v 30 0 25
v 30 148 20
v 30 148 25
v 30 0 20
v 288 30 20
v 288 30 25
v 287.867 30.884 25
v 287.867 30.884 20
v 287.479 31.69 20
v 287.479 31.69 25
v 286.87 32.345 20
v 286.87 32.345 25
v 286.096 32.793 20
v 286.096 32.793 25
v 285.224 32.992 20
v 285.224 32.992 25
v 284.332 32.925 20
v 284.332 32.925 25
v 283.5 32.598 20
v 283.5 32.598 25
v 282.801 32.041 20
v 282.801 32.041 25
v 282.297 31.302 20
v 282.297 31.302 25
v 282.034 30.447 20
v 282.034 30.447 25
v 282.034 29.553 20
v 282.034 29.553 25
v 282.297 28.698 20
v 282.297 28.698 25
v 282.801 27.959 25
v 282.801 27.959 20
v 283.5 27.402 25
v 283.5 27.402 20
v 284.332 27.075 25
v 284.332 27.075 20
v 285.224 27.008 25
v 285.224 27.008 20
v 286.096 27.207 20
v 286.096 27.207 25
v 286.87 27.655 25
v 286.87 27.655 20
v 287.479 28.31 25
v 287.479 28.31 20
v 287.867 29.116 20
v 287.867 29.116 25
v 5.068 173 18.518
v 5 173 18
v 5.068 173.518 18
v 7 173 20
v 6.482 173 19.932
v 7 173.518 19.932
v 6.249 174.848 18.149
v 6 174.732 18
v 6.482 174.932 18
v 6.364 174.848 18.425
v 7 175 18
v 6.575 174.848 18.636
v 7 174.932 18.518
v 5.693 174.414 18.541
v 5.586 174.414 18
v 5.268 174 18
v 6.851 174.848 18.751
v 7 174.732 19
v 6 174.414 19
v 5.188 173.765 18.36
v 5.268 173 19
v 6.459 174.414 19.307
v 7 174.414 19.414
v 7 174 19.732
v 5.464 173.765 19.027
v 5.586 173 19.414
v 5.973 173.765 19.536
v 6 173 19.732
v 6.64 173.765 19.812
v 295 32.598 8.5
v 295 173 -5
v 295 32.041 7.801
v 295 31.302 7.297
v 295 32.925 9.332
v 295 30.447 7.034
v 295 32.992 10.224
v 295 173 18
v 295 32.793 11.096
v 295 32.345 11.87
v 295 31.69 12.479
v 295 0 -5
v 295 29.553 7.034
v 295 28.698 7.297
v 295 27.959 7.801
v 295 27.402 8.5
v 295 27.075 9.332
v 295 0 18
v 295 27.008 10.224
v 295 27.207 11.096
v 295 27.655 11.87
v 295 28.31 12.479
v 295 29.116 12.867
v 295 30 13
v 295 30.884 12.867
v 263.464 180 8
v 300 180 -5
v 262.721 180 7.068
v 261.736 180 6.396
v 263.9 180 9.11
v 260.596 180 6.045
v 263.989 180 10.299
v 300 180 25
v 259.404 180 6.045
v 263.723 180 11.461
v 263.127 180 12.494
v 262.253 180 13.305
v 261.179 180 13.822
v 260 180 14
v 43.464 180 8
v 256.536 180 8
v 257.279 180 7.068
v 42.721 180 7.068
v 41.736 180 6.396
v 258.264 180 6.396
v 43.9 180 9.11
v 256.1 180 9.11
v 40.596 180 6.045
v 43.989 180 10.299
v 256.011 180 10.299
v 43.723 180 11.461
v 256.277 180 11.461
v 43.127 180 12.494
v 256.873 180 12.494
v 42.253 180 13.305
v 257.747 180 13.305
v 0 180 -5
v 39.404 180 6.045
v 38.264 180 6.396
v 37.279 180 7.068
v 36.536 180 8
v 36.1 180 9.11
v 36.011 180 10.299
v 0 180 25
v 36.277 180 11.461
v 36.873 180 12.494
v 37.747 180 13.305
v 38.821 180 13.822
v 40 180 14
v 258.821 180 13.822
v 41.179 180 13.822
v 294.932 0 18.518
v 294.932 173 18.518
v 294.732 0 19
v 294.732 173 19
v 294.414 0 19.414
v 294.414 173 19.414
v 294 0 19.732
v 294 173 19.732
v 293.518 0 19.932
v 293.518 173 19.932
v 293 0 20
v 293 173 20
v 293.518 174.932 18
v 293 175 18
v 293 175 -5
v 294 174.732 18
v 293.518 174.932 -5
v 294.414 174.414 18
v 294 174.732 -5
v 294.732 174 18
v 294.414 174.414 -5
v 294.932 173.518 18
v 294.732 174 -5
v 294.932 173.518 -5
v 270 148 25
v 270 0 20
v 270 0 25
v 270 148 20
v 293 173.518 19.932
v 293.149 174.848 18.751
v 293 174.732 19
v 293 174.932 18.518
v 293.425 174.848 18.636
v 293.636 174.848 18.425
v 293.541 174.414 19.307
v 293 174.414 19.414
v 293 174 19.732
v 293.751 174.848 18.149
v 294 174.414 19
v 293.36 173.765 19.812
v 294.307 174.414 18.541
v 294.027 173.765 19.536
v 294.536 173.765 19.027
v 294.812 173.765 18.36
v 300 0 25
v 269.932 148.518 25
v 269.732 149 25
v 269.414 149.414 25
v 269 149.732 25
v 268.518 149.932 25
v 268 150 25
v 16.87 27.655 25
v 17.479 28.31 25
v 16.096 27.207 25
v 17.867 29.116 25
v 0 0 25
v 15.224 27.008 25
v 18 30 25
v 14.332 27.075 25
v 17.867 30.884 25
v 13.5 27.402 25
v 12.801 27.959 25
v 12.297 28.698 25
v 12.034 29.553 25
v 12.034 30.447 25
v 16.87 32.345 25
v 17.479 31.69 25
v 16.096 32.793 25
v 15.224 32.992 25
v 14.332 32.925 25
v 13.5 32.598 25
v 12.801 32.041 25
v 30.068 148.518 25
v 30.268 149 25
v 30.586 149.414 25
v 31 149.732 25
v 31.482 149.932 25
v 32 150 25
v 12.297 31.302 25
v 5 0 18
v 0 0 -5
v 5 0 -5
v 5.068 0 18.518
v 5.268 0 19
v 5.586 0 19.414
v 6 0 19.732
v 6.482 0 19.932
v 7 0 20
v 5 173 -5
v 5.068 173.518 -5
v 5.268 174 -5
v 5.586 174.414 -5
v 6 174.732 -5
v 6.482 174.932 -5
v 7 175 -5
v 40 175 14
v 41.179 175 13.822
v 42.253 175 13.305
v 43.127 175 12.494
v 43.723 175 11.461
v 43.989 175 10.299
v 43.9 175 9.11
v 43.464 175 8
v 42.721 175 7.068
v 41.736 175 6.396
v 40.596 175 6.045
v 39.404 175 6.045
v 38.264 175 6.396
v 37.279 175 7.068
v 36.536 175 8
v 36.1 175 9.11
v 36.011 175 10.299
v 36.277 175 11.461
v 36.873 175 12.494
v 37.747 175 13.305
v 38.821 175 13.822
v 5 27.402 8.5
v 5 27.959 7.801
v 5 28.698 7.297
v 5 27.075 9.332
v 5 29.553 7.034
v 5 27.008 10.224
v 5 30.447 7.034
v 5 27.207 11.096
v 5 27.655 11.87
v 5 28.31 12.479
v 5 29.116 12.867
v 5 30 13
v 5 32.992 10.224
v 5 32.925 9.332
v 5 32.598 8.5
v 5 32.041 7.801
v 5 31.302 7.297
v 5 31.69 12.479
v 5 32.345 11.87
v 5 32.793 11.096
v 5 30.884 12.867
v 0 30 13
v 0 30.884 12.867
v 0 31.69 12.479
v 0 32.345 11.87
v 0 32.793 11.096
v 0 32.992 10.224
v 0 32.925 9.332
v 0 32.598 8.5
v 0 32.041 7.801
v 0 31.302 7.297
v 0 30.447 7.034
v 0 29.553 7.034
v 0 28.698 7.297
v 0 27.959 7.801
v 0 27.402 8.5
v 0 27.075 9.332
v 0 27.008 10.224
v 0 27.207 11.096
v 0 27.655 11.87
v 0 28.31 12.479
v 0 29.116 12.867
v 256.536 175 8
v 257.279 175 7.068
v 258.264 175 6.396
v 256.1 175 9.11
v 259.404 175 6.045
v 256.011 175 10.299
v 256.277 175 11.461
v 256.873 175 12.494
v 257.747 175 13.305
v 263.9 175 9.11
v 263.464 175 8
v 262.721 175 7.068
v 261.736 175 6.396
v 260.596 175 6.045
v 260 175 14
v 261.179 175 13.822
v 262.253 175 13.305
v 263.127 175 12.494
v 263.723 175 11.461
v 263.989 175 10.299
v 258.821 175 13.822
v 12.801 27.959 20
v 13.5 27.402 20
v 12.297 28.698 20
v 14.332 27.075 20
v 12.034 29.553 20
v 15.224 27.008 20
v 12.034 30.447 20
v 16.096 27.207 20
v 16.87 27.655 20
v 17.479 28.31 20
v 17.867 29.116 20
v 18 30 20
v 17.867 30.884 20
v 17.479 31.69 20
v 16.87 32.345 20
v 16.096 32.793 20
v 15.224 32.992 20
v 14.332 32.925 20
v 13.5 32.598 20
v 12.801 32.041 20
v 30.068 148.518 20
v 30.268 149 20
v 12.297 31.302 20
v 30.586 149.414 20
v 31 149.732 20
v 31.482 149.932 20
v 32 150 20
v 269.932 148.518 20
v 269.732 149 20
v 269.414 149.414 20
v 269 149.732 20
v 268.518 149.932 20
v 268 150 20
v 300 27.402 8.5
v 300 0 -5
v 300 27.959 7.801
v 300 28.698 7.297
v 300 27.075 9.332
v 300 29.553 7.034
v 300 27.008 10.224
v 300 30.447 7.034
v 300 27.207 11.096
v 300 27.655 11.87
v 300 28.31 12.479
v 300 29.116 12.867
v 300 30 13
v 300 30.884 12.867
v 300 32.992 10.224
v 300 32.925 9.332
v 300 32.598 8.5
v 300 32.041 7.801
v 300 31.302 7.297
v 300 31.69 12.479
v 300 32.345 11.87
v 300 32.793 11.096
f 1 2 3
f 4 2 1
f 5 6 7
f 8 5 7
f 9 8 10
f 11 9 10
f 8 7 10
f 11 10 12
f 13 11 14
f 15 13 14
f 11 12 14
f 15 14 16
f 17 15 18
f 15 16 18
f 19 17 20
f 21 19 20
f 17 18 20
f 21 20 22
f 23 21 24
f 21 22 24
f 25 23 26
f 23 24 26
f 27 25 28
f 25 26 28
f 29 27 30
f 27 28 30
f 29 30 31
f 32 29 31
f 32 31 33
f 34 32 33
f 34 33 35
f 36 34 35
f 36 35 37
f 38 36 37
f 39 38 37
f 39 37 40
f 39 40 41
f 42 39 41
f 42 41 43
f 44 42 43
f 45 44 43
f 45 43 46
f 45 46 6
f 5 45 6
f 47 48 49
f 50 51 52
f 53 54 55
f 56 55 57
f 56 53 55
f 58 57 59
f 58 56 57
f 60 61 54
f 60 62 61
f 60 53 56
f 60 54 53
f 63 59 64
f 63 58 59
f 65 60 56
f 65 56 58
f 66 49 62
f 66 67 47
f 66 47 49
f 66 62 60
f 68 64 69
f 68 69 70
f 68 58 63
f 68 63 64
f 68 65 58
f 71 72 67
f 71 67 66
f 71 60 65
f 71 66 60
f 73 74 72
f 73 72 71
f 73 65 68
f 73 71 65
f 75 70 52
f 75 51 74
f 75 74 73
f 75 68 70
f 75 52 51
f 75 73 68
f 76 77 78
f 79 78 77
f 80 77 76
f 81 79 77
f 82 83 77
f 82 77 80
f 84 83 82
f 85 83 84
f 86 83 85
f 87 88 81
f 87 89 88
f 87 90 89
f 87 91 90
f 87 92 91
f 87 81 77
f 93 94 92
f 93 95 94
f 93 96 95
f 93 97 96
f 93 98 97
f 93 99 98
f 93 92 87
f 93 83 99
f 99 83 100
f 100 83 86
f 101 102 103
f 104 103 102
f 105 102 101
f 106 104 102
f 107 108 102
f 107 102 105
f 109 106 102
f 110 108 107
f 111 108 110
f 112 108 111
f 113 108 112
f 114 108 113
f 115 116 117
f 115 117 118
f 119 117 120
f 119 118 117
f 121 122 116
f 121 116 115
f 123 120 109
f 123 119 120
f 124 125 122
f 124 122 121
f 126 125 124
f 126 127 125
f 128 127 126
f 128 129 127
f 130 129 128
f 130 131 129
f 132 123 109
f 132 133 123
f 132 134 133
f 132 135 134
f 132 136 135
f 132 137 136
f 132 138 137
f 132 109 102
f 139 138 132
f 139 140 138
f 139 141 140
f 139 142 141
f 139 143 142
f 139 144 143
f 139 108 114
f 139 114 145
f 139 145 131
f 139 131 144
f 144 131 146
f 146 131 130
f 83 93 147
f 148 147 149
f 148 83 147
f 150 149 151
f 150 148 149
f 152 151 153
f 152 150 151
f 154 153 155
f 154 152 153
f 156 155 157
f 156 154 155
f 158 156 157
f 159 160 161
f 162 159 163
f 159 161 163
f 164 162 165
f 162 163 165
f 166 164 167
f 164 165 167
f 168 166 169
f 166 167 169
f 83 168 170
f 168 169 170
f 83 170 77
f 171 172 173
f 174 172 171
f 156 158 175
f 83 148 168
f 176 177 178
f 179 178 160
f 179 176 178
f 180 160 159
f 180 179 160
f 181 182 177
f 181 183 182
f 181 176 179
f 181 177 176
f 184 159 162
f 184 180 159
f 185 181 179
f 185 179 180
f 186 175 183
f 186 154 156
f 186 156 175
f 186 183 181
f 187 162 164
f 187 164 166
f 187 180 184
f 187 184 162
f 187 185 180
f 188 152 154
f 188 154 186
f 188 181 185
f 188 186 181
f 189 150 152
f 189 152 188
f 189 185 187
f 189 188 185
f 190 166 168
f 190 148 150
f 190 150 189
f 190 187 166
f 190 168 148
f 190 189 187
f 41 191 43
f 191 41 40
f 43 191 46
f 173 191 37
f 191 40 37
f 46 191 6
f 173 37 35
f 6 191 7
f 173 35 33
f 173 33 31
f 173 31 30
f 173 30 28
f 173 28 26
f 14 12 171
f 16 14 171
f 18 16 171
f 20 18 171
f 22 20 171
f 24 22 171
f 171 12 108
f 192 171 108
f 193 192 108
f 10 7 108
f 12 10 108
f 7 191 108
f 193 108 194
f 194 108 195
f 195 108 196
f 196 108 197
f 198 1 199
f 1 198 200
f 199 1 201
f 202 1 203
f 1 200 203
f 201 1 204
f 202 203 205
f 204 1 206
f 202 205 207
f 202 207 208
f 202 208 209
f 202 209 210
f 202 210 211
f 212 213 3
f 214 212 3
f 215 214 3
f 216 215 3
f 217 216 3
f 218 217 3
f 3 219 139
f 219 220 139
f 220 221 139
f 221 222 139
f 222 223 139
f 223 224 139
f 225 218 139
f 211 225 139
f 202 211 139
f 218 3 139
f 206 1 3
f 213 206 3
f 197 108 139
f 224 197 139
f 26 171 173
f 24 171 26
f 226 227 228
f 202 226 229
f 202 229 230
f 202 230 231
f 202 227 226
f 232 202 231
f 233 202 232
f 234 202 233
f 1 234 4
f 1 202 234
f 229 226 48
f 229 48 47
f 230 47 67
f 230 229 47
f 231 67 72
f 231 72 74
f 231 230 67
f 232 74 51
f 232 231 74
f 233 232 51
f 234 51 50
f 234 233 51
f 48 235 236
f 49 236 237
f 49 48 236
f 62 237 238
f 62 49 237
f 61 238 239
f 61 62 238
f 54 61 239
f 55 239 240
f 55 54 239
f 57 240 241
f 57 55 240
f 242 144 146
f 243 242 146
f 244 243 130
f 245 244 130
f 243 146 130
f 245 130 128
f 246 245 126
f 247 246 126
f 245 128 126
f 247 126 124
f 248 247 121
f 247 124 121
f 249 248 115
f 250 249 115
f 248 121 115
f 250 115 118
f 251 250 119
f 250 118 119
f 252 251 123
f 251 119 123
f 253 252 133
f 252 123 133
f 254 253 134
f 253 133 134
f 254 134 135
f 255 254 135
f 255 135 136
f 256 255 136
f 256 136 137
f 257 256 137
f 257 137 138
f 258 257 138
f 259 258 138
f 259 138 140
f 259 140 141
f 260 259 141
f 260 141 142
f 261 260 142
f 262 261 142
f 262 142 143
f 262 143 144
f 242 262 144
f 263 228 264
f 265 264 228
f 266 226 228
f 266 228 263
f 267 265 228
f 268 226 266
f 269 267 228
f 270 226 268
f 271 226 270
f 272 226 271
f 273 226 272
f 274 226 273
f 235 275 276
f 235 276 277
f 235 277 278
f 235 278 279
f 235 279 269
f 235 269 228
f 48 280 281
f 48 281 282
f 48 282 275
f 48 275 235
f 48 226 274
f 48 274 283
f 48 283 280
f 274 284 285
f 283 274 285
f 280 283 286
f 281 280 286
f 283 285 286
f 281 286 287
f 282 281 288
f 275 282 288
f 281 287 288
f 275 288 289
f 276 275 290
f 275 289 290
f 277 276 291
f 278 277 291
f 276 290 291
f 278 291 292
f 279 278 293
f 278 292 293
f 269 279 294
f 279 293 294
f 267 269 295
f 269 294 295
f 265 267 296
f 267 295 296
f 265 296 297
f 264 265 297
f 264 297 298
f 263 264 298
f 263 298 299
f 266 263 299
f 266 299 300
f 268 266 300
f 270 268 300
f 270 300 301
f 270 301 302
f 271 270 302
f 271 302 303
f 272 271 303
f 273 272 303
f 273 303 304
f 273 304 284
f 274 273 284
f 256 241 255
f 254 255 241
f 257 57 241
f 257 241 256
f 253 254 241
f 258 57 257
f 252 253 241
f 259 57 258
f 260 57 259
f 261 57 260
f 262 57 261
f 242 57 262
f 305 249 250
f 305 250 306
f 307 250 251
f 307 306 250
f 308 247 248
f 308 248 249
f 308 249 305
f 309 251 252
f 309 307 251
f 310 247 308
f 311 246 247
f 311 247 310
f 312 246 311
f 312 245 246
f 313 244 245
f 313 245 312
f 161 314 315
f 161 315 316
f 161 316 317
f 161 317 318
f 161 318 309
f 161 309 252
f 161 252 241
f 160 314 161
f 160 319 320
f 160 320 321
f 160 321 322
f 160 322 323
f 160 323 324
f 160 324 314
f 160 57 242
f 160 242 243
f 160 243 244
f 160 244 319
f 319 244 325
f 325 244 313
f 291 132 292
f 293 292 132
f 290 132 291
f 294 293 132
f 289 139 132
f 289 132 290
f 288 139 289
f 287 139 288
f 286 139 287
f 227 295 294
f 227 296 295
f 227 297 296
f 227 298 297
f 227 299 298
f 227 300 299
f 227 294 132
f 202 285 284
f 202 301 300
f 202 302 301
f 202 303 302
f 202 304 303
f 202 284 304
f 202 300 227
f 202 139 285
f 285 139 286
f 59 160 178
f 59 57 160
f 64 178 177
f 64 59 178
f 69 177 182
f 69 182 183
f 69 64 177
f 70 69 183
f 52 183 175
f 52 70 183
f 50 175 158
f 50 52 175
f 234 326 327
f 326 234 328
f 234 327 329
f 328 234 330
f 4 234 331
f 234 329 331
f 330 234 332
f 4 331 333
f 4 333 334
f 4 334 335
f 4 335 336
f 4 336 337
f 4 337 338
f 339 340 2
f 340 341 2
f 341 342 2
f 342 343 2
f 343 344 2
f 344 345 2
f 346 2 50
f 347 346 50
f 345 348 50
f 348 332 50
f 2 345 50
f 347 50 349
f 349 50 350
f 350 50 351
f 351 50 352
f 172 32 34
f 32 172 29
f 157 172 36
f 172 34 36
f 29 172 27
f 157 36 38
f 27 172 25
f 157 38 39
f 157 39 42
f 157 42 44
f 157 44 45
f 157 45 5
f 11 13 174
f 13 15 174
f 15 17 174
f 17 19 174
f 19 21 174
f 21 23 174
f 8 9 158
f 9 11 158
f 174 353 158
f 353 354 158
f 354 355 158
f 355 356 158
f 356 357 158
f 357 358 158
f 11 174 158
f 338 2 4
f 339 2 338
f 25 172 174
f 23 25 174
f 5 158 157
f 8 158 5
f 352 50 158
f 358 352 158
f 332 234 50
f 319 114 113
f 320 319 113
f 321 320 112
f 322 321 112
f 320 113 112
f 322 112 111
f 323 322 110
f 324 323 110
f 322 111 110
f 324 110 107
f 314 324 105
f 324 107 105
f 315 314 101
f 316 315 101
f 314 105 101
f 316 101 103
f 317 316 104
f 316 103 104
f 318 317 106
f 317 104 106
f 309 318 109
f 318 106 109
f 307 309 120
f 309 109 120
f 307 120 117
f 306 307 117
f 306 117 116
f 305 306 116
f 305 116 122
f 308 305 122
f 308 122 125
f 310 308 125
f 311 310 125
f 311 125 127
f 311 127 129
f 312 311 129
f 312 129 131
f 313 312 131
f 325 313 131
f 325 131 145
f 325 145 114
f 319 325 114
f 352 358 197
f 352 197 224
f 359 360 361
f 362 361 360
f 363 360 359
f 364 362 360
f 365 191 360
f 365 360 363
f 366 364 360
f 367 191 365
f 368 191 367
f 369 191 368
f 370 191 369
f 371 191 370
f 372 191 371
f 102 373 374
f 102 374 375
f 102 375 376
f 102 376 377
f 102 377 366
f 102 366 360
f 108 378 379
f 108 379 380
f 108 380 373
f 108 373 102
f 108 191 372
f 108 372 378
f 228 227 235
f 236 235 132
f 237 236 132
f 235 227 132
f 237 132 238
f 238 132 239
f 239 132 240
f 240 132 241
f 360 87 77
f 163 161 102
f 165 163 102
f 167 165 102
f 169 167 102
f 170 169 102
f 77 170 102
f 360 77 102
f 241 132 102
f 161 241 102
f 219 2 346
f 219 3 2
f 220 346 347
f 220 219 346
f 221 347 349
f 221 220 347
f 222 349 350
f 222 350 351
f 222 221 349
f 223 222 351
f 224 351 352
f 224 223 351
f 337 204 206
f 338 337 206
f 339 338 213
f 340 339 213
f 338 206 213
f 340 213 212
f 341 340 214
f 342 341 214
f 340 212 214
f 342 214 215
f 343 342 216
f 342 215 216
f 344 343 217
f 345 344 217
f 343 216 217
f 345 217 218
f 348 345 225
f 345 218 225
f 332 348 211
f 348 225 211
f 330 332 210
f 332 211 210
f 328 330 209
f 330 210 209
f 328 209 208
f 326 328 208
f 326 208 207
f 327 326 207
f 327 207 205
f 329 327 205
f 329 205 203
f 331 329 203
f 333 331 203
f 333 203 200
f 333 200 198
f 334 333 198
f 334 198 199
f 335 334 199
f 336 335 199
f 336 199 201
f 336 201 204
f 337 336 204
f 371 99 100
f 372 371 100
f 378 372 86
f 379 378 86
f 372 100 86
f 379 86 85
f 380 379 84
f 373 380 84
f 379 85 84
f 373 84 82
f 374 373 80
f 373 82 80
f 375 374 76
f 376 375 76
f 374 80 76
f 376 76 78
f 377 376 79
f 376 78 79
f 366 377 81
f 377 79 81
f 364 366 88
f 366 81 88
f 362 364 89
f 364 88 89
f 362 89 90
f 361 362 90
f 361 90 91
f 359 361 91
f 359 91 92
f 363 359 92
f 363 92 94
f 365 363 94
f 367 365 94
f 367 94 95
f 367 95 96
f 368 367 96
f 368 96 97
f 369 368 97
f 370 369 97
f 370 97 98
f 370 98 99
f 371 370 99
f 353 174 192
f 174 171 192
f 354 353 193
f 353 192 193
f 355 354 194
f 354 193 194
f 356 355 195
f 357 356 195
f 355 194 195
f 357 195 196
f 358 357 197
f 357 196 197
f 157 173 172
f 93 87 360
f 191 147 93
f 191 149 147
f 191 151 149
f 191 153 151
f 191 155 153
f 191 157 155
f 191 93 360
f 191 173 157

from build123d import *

# Parameters (mm, degrees)
BOSS_EXTRUDE1_DEPTH = 25
CUT_EXTRUDE2_DEPTH  = 20
SKETCH6_R           = 3
CUT_EXTRUDE5_DEPTH  = 400
BOSS_EXTRUDE2_DEPTH = 5
SKETCH8_R           = 3
CUT_EXTRUDE6_DEPTH  = 350
FILLET3_R           = 2
SKETCH9_R           = 4
CUT_EXTRUDE7_DEPTH  = 350


with BuildPart() as part:
    # Sketch1 → Boss-Extrude1 (new body)
    with BuildSketch(Plane.XY):
        Polygon((0, 0), (0, 180), (300, 180), (300, 0), (270, 0), (270, 150), (30, 150), (30, 0), align=None)
    extrude(amount=BOSS_EXTRUDE1_DEPTH)

    # Sketch3 → Cut-Extrude2 (cut)
    with BuildSketch(Plane(origin=(0, 0, 0), x_dir=(-1, 0, 0), z_dir=(0, 0, -1))):
        Polygon((-5, 0), (-30, 0), (-30, 150), (-270, 150), (-270, 0), (-295, 0), (-295, 175), (-5, 175), align=None)
    extrude(amount=-CUT_EXTRUDE2_DEPTH, mode=Mode.SUBTRACT)

    # Sketch6 → Cut-Extrude5 (cut)
    with BuildSketch(Plane.XY.offset(25)):
        with Locations((15, 30)):
            Circle(SKETCH6_R)
        with Locations((285, 30)):
            Circle(SKETCH6_R)
    extrude(amount=-CUT_EXTRUDE5_DEPTH, mode=Mode.SUBTRACT)

    # Sketch7 → Boss-Extrude2 (add)
    with BuildSketch(Plane(origin=(0, 0, 0), x_dir=(-1, 0, 0), z_dir=(0, 0, -1))):
        Polygon((-300, 0), (-300, 180), (0, 180), (0, 0), (-5, 0), (-5, 175), (-295, 175), (-295, 0), align=None)
    extrude(amount=BOSS_EXTRUDE2_DEPTH)

    # Sketch8 → Cut-Extrude6 (cut)
    with BuildSketch(Plane.ZY):
        with Locations((10, 30)):
            Circle(SKETCH8_R)
    extrude(amount=-CUT_EXTRUDE6_DEPTH, mode=Mode.SUBTRACT)

    # Fillet3
    fillet3_edges = [part.edges().sort_by_distance(p)[0] for p in [
        (270, 150, 22.5),
        (30, 150, 22.5),
        (5, 87.5, 20),
        (5, 175, 7.5),
        (295, 87.5, 20),
        (150, 175, 20),
        (295, 175, 7.5),
    ]]
    fillet(fillet3_edges, radius=FILLET3_R)

    # Sketch9 → Cut-Extrude7 (cut)
    with BuildSketch(Plane(origin=(0, 180, 0), x_dir=(1, 0, 0), z_dir=(0, 1, 0))):
        with Locations(Location((40, -10, 0), (0, 0, 270))):
            Circle(SKETCH9_R)
        with Locations(Location((260, -10, 0), (0, 0, 270))):
            Circle(SKETCH9_R)
    extrude(amount=-CUT_EXTRUDE7_DEPTH, mode=Mode.SUBTRACT)


solid = part.part
